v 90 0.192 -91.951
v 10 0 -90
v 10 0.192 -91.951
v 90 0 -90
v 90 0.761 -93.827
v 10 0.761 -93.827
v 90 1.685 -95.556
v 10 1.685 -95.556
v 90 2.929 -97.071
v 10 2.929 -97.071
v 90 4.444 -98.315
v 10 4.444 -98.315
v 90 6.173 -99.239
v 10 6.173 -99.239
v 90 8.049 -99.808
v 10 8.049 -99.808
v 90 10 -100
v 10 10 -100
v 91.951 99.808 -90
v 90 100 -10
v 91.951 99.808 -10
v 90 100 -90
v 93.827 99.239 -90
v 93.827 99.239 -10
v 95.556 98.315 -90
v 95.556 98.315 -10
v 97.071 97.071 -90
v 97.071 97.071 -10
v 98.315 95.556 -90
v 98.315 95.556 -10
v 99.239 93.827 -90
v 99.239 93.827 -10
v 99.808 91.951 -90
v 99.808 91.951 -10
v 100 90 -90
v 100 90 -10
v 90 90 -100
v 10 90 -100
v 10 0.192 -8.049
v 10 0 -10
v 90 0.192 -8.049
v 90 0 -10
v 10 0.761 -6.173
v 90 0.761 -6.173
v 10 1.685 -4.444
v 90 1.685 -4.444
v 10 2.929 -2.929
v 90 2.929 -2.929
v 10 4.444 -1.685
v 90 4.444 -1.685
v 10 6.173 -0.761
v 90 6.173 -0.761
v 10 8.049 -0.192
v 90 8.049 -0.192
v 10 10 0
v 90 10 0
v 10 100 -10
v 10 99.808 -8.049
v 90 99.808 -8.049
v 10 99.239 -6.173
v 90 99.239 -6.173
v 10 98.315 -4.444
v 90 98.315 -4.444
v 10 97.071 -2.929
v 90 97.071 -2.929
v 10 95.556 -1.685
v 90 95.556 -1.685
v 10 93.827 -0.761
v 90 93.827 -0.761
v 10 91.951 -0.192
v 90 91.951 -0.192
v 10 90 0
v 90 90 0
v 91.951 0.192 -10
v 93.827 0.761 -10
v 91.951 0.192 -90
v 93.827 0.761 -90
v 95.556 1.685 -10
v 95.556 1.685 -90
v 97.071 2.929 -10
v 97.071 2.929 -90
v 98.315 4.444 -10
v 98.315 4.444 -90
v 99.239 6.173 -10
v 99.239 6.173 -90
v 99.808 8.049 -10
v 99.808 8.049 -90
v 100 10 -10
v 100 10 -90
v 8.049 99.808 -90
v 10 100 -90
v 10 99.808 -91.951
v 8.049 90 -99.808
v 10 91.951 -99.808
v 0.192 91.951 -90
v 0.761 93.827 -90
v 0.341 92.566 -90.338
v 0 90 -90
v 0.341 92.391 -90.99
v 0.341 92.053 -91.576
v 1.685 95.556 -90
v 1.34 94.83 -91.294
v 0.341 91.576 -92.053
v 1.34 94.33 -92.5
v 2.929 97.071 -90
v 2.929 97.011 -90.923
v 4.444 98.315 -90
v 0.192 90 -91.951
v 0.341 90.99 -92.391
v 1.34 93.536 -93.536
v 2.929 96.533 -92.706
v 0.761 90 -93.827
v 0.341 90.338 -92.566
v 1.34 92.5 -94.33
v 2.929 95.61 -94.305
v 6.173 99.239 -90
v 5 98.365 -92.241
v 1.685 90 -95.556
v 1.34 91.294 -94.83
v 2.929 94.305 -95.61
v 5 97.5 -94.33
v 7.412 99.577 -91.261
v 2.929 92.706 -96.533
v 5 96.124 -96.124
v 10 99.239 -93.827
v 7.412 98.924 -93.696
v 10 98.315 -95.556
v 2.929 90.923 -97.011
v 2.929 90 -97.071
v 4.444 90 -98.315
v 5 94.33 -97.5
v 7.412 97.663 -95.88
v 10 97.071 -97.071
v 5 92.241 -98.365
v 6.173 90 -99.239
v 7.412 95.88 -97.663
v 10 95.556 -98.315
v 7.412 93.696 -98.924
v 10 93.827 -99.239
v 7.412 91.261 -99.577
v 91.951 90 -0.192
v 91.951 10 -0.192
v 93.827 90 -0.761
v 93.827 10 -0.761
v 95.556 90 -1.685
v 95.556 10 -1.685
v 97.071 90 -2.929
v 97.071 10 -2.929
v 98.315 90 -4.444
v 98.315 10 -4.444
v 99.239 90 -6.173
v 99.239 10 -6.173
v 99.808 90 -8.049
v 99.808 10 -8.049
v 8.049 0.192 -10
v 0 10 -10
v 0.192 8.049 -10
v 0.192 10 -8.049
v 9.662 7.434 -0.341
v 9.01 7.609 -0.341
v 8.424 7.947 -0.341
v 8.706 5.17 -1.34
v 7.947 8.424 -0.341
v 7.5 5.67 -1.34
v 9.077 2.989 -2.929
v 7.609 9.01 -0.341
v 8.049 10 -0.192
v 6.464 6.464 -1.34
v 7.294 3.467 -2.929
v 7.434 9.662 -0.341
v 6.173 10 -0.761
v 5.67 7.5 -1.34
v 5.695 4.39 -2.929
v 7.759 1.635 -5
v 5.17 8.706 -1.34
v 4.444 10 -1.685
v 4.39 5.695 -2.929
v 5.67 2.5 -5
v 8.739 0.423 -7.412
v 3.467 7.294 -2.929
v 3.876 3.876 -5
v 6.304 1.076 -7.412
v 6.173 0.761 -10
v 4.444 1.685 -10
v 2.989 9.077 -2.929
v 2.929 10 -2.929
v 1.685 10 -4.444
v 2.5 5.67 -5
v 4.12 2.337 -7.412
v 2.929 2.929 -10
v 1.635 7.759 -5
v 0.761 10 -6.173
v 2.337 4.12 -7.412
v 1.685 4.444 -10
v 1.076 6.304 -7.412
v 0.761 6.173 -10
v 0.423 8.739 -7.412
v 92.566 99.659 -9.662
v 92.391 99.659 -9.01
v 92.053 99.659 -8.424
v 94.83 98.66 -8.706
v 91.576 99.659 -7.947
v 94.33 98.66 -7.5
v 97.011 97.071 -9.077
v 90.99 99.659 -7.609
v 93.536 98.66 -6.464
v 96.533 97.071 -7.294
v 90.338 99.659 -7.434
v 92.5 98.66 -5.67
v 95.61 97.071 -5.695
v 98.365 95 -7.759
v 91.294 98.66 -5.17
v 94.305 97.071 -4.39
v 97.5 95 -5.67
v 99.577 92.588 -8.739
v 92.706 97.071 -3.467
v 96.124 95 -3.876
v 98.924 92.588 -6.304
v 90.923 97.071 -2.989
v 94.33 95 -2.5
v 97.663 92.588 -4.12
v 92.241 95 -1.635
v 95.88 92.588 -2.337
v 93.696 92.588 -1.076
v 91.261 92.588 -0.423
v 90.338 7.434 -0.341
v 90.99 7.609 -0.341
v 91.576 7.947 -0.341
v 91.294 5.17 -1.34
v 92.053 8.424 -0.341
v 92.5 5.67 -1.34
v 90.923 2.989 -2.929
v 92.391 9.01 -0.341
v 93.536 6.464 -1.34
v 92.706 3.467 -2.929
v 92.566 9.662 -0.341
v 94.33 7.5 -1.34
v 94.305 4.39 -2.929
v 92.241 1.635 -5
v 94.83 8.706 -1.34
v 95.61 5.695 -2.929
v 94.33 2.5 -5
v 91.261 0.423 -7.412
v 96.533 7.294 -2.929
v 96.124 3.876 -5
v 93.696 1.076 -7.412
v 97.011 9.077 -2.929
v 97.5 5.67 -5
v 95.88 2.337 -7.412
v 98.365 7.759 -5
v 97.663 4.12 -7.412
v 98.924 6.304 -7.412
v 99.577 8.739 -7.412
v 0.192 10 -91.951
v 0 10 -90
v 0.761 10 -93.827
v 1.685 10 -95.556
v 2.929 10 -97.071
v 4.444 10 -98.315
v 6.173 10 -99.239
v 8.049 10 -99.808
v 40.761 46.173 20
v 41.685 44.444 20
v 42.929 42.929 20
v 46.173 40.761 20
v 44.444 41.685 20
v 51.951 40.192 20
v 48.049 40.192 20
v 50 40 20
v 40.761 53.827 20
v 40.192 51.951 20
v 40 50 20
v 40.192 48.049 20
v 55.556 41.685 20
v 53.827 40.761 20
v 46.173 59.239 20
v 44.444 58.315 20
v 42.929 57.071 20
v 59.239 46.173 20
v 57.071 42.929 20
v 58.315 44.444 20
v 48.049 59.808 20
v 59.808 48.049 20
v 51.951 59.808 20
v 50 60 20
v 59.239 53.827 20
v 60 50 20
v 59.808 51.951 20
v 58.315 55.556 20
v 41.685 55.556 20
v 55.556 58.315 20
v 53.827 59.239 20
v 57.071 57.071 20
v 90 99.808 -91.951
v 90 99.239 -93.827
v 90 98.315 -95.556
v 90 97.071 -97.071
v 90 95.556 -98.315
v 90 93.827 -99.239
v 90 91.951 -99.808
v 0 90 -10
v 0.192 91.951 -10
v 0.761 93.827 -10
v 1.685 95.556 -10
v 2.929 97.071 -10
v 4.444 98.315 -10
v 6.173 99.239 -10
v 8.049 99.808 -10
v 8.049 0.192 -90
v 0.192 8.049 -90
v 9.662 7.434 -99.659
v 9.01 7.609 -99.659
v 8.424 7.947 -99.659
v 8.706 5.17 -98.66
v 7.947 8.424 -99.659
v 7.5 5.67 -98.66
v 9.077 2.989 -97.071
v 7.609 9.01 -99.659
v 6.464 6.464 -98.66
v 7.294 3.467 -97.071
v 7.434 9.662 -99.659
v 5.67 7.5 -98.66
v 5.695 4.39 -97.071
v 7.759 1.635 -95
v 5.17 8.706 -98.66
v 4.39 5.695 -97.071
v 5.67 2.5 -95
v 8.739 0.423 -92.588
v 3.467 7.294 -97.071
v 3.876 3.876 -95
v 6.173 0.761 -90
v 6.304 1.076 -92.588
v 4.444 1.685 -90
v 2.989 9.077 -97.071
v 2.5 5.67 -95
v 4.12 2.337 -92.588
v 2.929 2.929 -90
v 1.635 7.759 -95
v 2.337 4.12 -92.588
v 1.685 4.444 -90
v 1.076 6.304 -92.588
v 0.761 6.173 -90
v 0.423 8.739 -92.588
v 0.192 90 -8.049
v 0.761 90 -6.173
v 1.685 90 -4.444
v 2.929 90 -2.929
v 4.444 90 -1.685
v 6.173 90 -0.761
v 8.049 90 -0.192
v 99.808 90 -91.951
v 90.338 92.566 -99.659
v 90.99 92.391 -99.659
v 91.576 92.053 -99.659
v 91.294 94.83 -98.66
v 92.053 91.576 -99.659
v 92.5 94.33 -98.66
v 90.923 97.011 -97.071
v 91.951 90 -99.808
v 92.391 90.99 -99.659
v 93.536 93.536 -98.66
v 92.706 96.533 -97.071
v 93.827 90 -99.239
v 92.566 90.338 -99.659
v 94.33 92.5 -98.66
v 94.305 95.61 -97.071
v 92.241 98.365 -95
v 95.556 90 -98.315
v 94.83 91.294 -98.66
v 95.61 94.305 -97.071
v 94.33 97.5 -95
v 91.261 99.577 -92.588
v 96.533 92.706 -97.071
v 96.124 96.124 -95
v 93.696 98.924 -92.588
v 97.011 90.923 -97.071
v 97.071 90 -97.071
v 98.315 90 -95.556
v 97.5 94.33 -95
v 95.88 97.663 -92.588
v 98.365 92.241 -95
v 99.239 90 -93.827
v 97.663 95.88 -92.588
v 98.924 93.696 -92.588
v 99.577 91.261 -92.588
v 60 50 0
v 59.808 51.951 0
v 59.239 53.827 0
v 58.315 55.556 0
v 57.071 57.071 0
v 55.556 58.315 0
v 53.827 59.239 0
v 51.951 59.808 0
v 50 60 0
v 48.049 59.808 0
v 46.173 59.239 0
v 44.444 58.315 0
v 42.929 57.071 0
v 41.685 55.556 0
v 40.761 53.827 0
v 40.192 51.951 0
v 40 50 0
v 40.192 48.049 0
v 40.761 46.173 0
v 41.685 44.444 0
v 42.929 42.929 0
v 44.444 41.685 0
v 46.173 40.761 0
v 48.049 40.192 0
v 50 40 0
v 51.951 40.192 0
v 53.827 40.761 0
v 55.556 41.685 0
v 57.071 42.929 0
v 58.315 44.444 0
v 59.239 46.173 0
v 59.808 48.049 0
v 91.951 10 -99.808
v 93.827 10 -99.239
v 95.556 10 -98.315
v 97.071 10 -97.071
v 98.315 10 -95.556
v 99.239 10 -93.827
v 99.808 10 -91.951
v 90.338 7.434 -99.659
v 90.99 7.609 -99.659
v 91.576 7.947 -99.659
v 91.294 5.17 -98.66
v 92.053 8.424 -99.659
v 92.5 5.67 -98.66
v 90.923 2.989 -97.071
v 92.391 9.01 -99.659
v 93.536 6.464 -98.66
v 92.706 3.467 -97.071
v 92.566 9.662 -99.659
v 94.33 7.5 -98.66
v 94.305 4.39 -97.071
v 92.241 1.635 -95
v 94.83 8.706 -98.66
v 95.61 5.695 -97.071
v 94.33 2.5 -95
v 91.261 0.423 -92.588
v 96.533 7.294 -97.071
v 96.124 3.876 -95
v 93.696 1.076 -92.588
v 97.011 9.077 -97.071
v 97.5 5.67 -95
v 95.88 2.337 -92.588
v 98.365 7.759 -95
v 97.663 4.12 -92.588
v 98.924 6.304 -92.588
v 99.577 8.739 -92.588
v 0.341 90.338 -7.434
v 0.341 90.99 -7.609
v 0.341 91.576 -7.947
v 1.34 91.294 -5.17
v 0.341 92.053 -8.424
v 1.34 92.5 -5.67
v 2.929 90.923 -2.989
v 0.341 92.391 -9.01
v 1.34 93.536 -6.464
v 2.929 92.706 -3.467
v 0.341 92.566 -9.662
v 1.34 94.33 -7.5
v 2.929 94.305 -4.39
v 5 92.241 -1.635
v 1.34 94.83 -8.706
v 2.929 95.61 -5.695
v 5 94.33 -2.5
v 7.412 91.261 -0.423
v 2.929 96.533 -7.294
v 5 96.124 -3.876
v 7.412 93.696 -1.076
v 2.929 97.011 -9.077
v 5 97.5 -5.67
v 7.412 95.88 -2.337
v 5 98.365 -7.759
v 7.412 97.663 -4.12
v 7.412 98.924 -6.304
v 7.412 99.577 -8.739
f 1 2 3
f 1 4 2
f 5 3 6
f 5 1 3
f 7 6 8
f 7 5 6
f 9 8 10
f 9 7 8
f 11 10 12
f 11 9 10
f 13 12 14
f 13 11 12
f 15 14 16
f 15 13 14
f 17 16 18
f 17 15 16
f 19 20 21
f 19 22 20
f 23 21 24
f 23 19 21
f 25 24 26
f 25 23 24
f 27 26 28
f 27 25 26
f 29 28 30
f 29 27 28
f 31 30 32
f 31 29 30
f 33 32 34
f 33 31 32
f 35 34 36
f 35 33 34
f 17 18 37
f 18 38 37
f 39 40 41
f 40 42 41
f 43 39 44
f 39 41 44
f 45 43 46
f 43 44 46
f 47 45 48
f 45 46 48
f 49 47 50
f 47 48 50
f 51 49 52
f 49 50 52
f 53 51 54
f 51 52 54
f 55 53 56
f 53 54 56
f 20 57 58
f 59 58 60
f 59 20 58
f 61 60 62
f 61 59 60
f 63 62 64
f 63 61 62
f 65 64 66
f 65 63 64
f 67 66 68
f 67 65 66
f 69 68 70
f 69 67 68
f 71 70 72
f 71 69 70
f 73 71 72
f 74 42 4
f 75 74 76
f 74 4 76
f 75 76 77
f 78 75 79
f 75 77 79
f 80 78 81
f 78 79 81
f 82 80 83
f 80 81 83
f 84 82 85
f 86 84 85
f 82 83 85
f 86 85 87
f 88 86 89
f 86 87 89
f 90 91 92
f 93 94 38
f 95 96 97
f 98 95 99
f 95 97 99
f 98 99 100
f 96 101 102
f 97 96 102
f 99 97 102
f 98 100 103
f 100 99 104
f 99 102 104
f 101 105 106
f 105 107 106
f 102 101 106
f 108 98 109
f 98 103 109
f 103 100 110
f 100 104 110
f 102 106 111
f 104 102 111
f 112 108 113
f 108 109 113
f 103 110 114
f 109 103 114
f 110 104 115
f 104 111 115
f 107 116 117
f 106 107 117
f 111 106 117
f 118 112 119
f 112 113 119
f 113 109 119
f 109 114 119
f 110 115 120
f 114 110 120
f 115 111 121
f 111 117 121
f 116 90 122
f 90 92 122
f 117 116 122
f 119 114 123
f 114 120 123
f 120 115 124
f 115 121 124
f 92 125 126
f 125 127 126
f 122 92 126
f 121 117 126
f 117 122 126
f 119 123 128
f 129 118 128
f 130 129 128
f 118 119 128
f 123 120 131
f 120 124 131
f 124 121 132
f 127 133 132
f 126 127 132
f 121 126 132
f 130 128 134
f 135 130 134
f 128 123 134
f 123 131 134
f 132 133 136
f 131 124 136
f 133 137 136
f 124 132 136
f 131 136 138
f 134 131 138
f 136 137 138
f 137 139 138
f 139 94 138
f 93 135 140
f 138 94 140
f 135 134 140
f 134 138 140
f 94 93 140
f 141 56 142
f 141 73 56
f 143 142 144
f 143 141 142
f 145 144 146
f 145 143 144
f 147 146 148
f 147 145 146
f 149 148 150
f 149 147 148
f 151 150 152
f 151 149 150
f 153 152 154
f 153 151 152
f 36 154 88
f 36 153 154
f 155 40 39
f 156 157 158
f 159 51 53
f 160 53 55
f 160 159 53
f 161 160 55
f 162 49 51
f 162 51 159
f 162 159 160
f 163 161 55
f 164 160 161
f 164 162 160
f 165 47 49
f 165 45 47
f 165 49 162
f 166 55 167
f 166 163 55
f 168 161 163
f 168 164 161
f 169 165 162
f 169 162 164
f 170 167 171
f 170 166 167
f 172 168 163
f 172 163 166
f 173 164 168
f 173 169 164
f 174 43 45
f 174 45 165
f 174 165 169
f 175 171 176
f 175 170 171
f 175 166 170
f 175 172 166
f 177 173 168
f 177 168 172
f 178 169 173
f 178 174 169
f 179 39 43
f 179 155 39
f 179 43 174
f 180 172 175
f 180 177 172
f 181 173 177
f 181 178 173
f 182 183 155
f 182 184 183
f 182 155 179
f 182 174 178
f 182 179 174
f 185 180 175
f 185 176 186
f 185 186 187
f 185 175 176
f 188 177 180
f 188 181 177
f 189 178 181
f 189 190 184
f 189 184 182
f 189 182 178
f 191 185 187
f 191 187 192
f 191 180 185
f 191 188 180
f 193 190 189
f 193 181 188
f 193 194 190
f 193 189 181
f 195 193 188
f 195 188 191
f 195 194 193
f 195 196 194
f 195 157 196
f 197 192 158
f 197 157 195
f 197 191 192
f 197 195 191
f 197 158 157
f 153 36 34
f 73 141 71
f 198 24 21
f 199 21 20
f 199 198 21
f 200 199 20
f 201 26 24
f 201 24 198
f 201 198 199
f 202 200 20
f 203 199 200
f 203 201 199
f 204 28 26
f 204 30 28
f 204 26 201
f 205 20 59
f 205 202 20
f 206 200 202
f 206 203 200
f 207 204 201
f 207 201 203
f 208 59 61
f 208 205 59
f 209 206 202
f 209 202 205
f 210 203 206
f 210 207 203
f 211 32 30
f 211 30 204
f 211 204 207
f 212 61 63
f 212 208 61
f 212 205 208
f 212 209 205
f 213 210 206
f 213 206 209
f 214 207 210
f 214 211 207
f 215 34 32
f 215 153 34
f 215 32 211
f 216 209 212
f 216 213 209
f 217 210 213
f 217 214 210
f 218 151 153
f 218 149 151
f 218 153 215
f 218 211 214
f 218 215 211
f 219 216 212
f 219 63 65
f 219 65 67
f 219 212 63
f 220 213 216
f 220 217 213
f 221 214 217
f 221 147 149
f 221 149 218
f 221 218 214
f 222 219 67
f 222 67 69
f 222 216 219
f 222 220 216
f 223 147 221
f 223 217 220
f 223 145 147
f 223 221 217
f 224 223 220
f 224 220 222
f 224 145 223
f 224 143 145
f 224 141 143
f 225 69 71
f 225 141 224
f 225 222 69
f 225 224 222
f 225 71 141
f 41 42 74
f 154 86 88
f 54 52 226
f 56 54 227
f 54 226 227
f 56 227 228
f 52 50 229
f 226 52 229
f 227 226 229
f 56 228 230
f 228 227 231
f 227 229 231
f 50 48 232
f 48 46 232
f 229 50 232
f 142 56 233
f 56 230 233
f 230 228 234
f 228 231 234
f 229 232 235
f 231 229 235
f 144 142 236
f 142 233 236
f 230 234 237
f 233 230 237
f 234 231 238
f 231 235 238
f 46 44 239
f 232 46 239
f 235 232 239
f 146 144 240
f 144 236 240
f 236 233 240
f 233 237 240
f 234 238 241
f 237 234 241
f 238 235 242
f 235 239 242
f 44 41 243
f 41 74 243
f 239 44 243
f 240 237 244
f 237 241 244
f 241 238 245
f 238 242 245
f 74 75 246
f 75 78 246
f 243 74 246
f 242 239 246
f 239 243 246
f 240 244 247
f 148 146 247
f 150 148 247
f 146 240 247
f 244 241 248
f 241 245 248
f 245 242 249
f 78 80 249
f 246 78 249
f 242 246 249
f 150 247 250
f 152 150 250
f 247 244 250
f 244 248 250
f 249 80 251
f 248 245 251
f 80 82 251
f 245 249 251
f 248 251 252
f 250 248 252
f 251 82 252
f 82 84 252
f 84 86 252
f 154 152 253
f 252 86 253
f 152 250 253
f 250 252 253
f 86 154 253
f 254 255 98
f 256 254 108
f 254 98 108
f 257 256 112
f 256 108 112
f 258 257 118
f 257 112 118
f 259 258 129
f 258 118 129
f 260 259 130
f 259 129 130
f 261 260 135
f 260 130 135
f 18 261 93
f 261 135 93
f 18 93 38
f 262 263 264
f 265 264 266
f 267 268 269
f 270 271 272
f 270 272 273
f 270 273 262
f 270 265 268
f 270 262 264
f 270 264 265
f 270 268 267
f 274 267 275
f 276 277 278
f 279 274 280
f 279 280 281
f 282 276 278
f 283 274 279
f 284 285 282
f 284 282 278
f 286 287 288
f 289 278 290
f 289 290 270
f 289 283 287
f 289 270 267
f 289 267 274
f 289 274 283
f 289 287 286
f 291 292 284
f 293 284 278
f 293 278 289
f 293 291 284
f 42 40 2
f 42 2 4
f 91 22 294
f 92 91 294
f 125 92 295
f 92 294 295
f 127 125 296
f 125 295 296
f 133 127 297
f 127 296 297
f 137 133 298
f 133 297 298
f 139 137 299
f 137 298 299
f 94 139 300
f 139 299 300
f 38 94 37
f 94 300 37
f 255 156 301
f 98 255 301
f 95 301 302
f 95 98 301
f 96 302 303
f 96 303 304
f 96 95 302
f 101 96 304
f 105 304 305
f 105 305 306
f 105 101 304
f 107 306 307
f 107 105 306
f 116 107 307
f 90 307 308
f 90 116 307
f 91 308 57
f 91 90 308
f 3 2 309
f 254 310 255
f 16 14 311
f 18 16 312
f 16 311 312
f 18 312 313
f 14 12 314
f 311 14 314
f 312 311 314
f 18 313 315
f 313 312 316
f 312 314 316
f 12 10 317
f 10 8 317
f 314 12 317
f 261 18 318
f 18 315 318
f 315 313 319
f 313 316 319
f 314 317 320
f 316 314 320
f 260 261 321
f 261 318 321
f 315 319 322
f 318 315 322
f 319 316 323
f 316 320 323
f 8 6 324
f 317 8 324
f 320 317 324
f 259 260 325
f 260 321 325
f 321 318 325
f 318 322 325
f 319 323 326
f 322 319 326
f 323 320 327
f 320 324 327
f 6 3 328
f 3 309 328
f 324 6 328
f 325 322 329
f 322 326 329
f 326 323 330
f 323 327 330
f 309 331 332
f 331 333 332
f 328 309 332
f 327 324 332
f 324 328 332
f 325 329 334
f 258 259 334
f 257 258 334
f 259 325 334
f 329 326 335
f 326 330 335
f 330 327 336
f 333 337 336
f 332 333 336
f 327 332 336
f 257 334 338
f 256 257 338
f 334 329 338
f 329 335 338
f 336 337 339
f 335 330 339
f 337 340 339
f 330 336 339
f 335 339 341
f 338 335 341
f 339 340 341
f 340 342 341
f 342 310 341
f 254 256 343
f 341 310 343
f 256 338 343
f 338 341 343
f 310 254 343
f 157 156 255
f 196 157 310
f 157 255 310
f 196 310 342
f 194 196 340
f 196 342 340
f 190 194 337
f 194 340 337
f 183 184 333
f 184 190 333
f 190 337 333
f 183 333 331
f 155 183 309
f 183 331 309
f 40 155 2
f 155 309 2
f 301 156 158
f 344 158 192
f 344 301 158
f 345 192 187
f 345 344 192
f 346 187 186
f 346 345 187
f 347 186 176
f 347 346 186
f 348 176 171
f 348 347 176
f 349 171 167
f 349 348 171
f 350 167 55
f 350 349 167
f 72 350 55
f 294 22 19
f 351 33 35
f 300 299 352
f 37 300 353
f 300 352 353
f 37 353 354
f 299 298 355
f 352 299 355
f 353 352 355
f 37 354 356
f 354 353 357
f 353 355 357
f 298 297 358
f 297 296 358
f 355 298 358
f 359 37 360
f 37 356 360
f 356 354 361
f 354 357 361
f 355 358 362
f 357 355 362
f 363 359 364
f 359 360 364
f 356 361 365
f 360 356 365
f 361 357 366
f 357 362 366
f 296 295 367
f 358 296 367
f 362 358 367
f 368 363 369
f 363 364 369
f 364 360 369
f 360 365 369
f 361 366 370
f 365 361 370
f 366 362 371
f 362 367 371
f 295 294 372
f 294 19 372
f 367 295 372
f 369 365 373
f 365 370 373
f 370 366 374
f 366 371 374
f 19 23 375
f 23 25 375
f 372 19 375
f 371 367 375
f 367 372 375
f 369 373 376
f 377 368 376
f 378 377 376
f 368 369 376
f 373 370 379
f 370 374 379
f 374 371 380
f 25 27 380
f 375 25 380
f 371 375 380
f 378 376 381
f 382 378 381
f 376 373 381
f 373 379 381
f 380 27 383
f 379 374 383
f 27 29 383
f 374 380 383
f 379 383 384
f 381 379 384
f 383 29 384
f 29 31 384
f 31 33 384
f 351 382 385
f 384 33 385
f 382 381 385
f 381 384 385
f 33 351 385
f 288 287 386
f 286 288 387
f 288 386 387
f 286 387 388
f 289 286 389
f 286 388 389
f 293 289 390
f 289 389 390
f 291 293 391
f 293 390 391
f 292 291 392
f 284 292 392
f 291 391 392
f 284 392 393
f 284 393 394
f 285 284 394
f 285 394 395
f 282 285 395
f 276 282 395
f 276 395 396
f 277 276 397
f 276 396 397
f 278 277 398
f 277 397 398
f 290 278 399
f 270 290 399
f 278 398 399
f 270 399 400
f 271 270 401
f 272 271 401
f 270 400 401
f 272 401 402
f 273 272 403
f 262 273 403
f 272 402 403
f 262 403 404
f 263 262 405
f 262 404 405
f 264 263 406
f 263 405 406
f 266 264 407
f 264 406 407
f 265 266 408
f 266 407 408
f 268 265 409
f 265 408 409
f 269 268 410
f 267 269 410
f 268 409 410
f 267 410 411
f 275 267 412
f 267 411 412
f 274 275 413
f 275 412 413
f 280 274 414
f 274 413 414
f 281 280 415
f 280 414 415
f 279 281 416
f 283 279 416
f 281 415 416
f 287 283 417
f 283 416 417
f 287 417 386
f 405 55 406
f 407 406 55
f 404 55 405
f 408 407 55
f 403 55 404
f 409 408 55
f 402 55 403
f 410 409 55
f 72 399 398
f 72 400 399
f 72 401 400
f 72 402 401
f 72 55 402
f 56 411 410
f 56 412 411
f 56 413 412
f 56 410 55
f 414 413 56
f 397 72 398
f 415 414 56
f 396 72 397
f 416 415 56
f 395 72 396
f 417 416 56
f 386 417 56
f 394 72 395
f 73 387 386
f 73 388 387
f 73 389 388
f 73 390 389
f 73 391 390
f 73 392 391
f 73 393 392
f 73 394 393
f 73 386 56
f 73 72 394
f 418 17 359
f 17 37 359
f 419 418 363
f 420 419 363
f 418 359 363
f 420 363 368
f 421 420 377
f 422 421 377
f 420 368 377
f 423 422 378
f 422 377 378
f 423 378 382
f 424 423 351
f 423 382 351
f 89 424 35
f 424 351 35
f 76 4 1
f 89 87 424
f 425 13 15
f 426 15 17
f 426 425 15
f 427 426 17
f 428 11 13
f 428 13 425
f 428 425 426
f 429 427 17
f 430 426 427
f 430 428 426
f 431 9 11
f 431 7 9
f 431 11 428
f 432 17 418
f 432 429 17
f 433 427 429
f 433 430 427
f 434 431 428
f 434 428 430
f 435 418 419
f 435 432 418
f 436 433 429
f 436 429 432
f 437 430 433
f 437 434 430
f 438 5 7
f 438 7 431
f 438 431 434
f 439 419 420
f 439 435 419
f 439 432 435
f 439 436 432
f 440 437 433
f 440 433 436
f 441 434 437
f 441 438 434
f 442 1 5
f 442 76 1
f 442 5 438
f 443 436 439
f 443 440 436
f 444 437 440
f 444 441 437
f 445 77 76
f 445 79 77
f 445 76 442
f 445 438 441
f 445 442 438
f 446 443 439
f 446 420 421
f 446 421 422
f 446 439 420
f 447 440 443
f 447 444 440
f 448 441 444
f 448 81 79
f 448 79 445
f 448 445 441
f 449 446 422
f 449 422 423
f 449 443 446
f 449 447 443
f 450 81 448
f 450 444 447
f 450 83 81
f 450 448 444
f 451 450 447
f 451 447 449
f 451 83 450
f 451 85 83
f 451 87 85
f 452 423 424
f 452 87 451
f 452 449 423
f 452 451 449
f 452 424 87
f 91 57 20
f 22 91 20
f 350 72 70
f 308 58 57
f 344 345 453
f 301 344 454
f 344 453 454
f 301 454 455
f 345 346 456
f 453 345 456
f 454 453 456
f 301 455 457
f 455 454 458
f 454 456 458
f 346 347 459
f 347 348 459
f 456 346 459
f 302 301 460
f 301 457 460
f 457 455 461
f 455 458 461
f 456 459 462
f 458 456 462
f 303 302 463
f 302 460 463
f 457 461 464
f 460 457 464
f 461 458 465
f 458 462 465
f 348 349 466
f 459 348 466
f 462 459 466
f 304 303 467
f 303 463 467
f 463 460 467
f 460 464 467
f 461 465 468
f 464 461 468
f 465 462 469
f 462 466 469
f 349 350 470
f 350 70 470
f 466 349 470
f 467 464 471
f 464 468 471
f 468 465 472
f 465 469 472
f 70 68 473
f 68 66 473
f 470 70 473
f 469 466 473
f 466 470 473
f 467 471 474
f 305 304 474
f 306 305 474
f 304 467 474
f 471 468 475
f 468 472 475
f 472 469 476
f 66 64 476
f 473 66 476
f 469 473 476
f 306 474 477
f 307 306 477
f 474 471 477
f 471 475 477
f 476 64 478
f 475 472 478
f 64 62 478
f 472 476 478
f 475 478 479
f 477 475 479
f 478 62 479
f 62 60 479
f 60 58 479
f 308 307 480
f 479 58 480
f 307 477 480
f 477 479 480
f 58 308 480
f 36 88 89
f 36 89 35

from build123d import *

# Parameters (mm, degrees)
F0_W     = 100
F0_H     = 100
F1_DEPTH = 100
F2_R     = 10
F3_DEPTH = 20
F4_R     = 10


with BuildPart() as f1:
    # F0 (on Top) → F1 (new body)
    with BuildSketch(Plane.XY):
        with Locations((50, 50)):
            Rectangle(F0_W, F0_H)
    extrude(amount=-F1_DEPTH)

    # F2 (on face) → F3 (join)
    with BuildSketch(Plane.XY):
        with Locations((50, 50)):
            Circle(F2_R)
    extrude(amount=F3_DEPTH)

    # F4
    f4_edges = [f1.edges().sort_by_distance(p)[0] for p in [
        (0, 0, -50),
        (100, 0, -50),
        (50, 0, 0),
        (50, 0, -100),
        (100, 50, 0),
        (100, 100, -50),
        (50, 100, 0),
        (0, 50, 0),
        (50, 100, -100),
        (0, 100, -50),
        (0, 50, -100),
        (100, 50, -100),
    ]]
    fillet(f4_edges, radius=F4_R)


solid = f1.part
